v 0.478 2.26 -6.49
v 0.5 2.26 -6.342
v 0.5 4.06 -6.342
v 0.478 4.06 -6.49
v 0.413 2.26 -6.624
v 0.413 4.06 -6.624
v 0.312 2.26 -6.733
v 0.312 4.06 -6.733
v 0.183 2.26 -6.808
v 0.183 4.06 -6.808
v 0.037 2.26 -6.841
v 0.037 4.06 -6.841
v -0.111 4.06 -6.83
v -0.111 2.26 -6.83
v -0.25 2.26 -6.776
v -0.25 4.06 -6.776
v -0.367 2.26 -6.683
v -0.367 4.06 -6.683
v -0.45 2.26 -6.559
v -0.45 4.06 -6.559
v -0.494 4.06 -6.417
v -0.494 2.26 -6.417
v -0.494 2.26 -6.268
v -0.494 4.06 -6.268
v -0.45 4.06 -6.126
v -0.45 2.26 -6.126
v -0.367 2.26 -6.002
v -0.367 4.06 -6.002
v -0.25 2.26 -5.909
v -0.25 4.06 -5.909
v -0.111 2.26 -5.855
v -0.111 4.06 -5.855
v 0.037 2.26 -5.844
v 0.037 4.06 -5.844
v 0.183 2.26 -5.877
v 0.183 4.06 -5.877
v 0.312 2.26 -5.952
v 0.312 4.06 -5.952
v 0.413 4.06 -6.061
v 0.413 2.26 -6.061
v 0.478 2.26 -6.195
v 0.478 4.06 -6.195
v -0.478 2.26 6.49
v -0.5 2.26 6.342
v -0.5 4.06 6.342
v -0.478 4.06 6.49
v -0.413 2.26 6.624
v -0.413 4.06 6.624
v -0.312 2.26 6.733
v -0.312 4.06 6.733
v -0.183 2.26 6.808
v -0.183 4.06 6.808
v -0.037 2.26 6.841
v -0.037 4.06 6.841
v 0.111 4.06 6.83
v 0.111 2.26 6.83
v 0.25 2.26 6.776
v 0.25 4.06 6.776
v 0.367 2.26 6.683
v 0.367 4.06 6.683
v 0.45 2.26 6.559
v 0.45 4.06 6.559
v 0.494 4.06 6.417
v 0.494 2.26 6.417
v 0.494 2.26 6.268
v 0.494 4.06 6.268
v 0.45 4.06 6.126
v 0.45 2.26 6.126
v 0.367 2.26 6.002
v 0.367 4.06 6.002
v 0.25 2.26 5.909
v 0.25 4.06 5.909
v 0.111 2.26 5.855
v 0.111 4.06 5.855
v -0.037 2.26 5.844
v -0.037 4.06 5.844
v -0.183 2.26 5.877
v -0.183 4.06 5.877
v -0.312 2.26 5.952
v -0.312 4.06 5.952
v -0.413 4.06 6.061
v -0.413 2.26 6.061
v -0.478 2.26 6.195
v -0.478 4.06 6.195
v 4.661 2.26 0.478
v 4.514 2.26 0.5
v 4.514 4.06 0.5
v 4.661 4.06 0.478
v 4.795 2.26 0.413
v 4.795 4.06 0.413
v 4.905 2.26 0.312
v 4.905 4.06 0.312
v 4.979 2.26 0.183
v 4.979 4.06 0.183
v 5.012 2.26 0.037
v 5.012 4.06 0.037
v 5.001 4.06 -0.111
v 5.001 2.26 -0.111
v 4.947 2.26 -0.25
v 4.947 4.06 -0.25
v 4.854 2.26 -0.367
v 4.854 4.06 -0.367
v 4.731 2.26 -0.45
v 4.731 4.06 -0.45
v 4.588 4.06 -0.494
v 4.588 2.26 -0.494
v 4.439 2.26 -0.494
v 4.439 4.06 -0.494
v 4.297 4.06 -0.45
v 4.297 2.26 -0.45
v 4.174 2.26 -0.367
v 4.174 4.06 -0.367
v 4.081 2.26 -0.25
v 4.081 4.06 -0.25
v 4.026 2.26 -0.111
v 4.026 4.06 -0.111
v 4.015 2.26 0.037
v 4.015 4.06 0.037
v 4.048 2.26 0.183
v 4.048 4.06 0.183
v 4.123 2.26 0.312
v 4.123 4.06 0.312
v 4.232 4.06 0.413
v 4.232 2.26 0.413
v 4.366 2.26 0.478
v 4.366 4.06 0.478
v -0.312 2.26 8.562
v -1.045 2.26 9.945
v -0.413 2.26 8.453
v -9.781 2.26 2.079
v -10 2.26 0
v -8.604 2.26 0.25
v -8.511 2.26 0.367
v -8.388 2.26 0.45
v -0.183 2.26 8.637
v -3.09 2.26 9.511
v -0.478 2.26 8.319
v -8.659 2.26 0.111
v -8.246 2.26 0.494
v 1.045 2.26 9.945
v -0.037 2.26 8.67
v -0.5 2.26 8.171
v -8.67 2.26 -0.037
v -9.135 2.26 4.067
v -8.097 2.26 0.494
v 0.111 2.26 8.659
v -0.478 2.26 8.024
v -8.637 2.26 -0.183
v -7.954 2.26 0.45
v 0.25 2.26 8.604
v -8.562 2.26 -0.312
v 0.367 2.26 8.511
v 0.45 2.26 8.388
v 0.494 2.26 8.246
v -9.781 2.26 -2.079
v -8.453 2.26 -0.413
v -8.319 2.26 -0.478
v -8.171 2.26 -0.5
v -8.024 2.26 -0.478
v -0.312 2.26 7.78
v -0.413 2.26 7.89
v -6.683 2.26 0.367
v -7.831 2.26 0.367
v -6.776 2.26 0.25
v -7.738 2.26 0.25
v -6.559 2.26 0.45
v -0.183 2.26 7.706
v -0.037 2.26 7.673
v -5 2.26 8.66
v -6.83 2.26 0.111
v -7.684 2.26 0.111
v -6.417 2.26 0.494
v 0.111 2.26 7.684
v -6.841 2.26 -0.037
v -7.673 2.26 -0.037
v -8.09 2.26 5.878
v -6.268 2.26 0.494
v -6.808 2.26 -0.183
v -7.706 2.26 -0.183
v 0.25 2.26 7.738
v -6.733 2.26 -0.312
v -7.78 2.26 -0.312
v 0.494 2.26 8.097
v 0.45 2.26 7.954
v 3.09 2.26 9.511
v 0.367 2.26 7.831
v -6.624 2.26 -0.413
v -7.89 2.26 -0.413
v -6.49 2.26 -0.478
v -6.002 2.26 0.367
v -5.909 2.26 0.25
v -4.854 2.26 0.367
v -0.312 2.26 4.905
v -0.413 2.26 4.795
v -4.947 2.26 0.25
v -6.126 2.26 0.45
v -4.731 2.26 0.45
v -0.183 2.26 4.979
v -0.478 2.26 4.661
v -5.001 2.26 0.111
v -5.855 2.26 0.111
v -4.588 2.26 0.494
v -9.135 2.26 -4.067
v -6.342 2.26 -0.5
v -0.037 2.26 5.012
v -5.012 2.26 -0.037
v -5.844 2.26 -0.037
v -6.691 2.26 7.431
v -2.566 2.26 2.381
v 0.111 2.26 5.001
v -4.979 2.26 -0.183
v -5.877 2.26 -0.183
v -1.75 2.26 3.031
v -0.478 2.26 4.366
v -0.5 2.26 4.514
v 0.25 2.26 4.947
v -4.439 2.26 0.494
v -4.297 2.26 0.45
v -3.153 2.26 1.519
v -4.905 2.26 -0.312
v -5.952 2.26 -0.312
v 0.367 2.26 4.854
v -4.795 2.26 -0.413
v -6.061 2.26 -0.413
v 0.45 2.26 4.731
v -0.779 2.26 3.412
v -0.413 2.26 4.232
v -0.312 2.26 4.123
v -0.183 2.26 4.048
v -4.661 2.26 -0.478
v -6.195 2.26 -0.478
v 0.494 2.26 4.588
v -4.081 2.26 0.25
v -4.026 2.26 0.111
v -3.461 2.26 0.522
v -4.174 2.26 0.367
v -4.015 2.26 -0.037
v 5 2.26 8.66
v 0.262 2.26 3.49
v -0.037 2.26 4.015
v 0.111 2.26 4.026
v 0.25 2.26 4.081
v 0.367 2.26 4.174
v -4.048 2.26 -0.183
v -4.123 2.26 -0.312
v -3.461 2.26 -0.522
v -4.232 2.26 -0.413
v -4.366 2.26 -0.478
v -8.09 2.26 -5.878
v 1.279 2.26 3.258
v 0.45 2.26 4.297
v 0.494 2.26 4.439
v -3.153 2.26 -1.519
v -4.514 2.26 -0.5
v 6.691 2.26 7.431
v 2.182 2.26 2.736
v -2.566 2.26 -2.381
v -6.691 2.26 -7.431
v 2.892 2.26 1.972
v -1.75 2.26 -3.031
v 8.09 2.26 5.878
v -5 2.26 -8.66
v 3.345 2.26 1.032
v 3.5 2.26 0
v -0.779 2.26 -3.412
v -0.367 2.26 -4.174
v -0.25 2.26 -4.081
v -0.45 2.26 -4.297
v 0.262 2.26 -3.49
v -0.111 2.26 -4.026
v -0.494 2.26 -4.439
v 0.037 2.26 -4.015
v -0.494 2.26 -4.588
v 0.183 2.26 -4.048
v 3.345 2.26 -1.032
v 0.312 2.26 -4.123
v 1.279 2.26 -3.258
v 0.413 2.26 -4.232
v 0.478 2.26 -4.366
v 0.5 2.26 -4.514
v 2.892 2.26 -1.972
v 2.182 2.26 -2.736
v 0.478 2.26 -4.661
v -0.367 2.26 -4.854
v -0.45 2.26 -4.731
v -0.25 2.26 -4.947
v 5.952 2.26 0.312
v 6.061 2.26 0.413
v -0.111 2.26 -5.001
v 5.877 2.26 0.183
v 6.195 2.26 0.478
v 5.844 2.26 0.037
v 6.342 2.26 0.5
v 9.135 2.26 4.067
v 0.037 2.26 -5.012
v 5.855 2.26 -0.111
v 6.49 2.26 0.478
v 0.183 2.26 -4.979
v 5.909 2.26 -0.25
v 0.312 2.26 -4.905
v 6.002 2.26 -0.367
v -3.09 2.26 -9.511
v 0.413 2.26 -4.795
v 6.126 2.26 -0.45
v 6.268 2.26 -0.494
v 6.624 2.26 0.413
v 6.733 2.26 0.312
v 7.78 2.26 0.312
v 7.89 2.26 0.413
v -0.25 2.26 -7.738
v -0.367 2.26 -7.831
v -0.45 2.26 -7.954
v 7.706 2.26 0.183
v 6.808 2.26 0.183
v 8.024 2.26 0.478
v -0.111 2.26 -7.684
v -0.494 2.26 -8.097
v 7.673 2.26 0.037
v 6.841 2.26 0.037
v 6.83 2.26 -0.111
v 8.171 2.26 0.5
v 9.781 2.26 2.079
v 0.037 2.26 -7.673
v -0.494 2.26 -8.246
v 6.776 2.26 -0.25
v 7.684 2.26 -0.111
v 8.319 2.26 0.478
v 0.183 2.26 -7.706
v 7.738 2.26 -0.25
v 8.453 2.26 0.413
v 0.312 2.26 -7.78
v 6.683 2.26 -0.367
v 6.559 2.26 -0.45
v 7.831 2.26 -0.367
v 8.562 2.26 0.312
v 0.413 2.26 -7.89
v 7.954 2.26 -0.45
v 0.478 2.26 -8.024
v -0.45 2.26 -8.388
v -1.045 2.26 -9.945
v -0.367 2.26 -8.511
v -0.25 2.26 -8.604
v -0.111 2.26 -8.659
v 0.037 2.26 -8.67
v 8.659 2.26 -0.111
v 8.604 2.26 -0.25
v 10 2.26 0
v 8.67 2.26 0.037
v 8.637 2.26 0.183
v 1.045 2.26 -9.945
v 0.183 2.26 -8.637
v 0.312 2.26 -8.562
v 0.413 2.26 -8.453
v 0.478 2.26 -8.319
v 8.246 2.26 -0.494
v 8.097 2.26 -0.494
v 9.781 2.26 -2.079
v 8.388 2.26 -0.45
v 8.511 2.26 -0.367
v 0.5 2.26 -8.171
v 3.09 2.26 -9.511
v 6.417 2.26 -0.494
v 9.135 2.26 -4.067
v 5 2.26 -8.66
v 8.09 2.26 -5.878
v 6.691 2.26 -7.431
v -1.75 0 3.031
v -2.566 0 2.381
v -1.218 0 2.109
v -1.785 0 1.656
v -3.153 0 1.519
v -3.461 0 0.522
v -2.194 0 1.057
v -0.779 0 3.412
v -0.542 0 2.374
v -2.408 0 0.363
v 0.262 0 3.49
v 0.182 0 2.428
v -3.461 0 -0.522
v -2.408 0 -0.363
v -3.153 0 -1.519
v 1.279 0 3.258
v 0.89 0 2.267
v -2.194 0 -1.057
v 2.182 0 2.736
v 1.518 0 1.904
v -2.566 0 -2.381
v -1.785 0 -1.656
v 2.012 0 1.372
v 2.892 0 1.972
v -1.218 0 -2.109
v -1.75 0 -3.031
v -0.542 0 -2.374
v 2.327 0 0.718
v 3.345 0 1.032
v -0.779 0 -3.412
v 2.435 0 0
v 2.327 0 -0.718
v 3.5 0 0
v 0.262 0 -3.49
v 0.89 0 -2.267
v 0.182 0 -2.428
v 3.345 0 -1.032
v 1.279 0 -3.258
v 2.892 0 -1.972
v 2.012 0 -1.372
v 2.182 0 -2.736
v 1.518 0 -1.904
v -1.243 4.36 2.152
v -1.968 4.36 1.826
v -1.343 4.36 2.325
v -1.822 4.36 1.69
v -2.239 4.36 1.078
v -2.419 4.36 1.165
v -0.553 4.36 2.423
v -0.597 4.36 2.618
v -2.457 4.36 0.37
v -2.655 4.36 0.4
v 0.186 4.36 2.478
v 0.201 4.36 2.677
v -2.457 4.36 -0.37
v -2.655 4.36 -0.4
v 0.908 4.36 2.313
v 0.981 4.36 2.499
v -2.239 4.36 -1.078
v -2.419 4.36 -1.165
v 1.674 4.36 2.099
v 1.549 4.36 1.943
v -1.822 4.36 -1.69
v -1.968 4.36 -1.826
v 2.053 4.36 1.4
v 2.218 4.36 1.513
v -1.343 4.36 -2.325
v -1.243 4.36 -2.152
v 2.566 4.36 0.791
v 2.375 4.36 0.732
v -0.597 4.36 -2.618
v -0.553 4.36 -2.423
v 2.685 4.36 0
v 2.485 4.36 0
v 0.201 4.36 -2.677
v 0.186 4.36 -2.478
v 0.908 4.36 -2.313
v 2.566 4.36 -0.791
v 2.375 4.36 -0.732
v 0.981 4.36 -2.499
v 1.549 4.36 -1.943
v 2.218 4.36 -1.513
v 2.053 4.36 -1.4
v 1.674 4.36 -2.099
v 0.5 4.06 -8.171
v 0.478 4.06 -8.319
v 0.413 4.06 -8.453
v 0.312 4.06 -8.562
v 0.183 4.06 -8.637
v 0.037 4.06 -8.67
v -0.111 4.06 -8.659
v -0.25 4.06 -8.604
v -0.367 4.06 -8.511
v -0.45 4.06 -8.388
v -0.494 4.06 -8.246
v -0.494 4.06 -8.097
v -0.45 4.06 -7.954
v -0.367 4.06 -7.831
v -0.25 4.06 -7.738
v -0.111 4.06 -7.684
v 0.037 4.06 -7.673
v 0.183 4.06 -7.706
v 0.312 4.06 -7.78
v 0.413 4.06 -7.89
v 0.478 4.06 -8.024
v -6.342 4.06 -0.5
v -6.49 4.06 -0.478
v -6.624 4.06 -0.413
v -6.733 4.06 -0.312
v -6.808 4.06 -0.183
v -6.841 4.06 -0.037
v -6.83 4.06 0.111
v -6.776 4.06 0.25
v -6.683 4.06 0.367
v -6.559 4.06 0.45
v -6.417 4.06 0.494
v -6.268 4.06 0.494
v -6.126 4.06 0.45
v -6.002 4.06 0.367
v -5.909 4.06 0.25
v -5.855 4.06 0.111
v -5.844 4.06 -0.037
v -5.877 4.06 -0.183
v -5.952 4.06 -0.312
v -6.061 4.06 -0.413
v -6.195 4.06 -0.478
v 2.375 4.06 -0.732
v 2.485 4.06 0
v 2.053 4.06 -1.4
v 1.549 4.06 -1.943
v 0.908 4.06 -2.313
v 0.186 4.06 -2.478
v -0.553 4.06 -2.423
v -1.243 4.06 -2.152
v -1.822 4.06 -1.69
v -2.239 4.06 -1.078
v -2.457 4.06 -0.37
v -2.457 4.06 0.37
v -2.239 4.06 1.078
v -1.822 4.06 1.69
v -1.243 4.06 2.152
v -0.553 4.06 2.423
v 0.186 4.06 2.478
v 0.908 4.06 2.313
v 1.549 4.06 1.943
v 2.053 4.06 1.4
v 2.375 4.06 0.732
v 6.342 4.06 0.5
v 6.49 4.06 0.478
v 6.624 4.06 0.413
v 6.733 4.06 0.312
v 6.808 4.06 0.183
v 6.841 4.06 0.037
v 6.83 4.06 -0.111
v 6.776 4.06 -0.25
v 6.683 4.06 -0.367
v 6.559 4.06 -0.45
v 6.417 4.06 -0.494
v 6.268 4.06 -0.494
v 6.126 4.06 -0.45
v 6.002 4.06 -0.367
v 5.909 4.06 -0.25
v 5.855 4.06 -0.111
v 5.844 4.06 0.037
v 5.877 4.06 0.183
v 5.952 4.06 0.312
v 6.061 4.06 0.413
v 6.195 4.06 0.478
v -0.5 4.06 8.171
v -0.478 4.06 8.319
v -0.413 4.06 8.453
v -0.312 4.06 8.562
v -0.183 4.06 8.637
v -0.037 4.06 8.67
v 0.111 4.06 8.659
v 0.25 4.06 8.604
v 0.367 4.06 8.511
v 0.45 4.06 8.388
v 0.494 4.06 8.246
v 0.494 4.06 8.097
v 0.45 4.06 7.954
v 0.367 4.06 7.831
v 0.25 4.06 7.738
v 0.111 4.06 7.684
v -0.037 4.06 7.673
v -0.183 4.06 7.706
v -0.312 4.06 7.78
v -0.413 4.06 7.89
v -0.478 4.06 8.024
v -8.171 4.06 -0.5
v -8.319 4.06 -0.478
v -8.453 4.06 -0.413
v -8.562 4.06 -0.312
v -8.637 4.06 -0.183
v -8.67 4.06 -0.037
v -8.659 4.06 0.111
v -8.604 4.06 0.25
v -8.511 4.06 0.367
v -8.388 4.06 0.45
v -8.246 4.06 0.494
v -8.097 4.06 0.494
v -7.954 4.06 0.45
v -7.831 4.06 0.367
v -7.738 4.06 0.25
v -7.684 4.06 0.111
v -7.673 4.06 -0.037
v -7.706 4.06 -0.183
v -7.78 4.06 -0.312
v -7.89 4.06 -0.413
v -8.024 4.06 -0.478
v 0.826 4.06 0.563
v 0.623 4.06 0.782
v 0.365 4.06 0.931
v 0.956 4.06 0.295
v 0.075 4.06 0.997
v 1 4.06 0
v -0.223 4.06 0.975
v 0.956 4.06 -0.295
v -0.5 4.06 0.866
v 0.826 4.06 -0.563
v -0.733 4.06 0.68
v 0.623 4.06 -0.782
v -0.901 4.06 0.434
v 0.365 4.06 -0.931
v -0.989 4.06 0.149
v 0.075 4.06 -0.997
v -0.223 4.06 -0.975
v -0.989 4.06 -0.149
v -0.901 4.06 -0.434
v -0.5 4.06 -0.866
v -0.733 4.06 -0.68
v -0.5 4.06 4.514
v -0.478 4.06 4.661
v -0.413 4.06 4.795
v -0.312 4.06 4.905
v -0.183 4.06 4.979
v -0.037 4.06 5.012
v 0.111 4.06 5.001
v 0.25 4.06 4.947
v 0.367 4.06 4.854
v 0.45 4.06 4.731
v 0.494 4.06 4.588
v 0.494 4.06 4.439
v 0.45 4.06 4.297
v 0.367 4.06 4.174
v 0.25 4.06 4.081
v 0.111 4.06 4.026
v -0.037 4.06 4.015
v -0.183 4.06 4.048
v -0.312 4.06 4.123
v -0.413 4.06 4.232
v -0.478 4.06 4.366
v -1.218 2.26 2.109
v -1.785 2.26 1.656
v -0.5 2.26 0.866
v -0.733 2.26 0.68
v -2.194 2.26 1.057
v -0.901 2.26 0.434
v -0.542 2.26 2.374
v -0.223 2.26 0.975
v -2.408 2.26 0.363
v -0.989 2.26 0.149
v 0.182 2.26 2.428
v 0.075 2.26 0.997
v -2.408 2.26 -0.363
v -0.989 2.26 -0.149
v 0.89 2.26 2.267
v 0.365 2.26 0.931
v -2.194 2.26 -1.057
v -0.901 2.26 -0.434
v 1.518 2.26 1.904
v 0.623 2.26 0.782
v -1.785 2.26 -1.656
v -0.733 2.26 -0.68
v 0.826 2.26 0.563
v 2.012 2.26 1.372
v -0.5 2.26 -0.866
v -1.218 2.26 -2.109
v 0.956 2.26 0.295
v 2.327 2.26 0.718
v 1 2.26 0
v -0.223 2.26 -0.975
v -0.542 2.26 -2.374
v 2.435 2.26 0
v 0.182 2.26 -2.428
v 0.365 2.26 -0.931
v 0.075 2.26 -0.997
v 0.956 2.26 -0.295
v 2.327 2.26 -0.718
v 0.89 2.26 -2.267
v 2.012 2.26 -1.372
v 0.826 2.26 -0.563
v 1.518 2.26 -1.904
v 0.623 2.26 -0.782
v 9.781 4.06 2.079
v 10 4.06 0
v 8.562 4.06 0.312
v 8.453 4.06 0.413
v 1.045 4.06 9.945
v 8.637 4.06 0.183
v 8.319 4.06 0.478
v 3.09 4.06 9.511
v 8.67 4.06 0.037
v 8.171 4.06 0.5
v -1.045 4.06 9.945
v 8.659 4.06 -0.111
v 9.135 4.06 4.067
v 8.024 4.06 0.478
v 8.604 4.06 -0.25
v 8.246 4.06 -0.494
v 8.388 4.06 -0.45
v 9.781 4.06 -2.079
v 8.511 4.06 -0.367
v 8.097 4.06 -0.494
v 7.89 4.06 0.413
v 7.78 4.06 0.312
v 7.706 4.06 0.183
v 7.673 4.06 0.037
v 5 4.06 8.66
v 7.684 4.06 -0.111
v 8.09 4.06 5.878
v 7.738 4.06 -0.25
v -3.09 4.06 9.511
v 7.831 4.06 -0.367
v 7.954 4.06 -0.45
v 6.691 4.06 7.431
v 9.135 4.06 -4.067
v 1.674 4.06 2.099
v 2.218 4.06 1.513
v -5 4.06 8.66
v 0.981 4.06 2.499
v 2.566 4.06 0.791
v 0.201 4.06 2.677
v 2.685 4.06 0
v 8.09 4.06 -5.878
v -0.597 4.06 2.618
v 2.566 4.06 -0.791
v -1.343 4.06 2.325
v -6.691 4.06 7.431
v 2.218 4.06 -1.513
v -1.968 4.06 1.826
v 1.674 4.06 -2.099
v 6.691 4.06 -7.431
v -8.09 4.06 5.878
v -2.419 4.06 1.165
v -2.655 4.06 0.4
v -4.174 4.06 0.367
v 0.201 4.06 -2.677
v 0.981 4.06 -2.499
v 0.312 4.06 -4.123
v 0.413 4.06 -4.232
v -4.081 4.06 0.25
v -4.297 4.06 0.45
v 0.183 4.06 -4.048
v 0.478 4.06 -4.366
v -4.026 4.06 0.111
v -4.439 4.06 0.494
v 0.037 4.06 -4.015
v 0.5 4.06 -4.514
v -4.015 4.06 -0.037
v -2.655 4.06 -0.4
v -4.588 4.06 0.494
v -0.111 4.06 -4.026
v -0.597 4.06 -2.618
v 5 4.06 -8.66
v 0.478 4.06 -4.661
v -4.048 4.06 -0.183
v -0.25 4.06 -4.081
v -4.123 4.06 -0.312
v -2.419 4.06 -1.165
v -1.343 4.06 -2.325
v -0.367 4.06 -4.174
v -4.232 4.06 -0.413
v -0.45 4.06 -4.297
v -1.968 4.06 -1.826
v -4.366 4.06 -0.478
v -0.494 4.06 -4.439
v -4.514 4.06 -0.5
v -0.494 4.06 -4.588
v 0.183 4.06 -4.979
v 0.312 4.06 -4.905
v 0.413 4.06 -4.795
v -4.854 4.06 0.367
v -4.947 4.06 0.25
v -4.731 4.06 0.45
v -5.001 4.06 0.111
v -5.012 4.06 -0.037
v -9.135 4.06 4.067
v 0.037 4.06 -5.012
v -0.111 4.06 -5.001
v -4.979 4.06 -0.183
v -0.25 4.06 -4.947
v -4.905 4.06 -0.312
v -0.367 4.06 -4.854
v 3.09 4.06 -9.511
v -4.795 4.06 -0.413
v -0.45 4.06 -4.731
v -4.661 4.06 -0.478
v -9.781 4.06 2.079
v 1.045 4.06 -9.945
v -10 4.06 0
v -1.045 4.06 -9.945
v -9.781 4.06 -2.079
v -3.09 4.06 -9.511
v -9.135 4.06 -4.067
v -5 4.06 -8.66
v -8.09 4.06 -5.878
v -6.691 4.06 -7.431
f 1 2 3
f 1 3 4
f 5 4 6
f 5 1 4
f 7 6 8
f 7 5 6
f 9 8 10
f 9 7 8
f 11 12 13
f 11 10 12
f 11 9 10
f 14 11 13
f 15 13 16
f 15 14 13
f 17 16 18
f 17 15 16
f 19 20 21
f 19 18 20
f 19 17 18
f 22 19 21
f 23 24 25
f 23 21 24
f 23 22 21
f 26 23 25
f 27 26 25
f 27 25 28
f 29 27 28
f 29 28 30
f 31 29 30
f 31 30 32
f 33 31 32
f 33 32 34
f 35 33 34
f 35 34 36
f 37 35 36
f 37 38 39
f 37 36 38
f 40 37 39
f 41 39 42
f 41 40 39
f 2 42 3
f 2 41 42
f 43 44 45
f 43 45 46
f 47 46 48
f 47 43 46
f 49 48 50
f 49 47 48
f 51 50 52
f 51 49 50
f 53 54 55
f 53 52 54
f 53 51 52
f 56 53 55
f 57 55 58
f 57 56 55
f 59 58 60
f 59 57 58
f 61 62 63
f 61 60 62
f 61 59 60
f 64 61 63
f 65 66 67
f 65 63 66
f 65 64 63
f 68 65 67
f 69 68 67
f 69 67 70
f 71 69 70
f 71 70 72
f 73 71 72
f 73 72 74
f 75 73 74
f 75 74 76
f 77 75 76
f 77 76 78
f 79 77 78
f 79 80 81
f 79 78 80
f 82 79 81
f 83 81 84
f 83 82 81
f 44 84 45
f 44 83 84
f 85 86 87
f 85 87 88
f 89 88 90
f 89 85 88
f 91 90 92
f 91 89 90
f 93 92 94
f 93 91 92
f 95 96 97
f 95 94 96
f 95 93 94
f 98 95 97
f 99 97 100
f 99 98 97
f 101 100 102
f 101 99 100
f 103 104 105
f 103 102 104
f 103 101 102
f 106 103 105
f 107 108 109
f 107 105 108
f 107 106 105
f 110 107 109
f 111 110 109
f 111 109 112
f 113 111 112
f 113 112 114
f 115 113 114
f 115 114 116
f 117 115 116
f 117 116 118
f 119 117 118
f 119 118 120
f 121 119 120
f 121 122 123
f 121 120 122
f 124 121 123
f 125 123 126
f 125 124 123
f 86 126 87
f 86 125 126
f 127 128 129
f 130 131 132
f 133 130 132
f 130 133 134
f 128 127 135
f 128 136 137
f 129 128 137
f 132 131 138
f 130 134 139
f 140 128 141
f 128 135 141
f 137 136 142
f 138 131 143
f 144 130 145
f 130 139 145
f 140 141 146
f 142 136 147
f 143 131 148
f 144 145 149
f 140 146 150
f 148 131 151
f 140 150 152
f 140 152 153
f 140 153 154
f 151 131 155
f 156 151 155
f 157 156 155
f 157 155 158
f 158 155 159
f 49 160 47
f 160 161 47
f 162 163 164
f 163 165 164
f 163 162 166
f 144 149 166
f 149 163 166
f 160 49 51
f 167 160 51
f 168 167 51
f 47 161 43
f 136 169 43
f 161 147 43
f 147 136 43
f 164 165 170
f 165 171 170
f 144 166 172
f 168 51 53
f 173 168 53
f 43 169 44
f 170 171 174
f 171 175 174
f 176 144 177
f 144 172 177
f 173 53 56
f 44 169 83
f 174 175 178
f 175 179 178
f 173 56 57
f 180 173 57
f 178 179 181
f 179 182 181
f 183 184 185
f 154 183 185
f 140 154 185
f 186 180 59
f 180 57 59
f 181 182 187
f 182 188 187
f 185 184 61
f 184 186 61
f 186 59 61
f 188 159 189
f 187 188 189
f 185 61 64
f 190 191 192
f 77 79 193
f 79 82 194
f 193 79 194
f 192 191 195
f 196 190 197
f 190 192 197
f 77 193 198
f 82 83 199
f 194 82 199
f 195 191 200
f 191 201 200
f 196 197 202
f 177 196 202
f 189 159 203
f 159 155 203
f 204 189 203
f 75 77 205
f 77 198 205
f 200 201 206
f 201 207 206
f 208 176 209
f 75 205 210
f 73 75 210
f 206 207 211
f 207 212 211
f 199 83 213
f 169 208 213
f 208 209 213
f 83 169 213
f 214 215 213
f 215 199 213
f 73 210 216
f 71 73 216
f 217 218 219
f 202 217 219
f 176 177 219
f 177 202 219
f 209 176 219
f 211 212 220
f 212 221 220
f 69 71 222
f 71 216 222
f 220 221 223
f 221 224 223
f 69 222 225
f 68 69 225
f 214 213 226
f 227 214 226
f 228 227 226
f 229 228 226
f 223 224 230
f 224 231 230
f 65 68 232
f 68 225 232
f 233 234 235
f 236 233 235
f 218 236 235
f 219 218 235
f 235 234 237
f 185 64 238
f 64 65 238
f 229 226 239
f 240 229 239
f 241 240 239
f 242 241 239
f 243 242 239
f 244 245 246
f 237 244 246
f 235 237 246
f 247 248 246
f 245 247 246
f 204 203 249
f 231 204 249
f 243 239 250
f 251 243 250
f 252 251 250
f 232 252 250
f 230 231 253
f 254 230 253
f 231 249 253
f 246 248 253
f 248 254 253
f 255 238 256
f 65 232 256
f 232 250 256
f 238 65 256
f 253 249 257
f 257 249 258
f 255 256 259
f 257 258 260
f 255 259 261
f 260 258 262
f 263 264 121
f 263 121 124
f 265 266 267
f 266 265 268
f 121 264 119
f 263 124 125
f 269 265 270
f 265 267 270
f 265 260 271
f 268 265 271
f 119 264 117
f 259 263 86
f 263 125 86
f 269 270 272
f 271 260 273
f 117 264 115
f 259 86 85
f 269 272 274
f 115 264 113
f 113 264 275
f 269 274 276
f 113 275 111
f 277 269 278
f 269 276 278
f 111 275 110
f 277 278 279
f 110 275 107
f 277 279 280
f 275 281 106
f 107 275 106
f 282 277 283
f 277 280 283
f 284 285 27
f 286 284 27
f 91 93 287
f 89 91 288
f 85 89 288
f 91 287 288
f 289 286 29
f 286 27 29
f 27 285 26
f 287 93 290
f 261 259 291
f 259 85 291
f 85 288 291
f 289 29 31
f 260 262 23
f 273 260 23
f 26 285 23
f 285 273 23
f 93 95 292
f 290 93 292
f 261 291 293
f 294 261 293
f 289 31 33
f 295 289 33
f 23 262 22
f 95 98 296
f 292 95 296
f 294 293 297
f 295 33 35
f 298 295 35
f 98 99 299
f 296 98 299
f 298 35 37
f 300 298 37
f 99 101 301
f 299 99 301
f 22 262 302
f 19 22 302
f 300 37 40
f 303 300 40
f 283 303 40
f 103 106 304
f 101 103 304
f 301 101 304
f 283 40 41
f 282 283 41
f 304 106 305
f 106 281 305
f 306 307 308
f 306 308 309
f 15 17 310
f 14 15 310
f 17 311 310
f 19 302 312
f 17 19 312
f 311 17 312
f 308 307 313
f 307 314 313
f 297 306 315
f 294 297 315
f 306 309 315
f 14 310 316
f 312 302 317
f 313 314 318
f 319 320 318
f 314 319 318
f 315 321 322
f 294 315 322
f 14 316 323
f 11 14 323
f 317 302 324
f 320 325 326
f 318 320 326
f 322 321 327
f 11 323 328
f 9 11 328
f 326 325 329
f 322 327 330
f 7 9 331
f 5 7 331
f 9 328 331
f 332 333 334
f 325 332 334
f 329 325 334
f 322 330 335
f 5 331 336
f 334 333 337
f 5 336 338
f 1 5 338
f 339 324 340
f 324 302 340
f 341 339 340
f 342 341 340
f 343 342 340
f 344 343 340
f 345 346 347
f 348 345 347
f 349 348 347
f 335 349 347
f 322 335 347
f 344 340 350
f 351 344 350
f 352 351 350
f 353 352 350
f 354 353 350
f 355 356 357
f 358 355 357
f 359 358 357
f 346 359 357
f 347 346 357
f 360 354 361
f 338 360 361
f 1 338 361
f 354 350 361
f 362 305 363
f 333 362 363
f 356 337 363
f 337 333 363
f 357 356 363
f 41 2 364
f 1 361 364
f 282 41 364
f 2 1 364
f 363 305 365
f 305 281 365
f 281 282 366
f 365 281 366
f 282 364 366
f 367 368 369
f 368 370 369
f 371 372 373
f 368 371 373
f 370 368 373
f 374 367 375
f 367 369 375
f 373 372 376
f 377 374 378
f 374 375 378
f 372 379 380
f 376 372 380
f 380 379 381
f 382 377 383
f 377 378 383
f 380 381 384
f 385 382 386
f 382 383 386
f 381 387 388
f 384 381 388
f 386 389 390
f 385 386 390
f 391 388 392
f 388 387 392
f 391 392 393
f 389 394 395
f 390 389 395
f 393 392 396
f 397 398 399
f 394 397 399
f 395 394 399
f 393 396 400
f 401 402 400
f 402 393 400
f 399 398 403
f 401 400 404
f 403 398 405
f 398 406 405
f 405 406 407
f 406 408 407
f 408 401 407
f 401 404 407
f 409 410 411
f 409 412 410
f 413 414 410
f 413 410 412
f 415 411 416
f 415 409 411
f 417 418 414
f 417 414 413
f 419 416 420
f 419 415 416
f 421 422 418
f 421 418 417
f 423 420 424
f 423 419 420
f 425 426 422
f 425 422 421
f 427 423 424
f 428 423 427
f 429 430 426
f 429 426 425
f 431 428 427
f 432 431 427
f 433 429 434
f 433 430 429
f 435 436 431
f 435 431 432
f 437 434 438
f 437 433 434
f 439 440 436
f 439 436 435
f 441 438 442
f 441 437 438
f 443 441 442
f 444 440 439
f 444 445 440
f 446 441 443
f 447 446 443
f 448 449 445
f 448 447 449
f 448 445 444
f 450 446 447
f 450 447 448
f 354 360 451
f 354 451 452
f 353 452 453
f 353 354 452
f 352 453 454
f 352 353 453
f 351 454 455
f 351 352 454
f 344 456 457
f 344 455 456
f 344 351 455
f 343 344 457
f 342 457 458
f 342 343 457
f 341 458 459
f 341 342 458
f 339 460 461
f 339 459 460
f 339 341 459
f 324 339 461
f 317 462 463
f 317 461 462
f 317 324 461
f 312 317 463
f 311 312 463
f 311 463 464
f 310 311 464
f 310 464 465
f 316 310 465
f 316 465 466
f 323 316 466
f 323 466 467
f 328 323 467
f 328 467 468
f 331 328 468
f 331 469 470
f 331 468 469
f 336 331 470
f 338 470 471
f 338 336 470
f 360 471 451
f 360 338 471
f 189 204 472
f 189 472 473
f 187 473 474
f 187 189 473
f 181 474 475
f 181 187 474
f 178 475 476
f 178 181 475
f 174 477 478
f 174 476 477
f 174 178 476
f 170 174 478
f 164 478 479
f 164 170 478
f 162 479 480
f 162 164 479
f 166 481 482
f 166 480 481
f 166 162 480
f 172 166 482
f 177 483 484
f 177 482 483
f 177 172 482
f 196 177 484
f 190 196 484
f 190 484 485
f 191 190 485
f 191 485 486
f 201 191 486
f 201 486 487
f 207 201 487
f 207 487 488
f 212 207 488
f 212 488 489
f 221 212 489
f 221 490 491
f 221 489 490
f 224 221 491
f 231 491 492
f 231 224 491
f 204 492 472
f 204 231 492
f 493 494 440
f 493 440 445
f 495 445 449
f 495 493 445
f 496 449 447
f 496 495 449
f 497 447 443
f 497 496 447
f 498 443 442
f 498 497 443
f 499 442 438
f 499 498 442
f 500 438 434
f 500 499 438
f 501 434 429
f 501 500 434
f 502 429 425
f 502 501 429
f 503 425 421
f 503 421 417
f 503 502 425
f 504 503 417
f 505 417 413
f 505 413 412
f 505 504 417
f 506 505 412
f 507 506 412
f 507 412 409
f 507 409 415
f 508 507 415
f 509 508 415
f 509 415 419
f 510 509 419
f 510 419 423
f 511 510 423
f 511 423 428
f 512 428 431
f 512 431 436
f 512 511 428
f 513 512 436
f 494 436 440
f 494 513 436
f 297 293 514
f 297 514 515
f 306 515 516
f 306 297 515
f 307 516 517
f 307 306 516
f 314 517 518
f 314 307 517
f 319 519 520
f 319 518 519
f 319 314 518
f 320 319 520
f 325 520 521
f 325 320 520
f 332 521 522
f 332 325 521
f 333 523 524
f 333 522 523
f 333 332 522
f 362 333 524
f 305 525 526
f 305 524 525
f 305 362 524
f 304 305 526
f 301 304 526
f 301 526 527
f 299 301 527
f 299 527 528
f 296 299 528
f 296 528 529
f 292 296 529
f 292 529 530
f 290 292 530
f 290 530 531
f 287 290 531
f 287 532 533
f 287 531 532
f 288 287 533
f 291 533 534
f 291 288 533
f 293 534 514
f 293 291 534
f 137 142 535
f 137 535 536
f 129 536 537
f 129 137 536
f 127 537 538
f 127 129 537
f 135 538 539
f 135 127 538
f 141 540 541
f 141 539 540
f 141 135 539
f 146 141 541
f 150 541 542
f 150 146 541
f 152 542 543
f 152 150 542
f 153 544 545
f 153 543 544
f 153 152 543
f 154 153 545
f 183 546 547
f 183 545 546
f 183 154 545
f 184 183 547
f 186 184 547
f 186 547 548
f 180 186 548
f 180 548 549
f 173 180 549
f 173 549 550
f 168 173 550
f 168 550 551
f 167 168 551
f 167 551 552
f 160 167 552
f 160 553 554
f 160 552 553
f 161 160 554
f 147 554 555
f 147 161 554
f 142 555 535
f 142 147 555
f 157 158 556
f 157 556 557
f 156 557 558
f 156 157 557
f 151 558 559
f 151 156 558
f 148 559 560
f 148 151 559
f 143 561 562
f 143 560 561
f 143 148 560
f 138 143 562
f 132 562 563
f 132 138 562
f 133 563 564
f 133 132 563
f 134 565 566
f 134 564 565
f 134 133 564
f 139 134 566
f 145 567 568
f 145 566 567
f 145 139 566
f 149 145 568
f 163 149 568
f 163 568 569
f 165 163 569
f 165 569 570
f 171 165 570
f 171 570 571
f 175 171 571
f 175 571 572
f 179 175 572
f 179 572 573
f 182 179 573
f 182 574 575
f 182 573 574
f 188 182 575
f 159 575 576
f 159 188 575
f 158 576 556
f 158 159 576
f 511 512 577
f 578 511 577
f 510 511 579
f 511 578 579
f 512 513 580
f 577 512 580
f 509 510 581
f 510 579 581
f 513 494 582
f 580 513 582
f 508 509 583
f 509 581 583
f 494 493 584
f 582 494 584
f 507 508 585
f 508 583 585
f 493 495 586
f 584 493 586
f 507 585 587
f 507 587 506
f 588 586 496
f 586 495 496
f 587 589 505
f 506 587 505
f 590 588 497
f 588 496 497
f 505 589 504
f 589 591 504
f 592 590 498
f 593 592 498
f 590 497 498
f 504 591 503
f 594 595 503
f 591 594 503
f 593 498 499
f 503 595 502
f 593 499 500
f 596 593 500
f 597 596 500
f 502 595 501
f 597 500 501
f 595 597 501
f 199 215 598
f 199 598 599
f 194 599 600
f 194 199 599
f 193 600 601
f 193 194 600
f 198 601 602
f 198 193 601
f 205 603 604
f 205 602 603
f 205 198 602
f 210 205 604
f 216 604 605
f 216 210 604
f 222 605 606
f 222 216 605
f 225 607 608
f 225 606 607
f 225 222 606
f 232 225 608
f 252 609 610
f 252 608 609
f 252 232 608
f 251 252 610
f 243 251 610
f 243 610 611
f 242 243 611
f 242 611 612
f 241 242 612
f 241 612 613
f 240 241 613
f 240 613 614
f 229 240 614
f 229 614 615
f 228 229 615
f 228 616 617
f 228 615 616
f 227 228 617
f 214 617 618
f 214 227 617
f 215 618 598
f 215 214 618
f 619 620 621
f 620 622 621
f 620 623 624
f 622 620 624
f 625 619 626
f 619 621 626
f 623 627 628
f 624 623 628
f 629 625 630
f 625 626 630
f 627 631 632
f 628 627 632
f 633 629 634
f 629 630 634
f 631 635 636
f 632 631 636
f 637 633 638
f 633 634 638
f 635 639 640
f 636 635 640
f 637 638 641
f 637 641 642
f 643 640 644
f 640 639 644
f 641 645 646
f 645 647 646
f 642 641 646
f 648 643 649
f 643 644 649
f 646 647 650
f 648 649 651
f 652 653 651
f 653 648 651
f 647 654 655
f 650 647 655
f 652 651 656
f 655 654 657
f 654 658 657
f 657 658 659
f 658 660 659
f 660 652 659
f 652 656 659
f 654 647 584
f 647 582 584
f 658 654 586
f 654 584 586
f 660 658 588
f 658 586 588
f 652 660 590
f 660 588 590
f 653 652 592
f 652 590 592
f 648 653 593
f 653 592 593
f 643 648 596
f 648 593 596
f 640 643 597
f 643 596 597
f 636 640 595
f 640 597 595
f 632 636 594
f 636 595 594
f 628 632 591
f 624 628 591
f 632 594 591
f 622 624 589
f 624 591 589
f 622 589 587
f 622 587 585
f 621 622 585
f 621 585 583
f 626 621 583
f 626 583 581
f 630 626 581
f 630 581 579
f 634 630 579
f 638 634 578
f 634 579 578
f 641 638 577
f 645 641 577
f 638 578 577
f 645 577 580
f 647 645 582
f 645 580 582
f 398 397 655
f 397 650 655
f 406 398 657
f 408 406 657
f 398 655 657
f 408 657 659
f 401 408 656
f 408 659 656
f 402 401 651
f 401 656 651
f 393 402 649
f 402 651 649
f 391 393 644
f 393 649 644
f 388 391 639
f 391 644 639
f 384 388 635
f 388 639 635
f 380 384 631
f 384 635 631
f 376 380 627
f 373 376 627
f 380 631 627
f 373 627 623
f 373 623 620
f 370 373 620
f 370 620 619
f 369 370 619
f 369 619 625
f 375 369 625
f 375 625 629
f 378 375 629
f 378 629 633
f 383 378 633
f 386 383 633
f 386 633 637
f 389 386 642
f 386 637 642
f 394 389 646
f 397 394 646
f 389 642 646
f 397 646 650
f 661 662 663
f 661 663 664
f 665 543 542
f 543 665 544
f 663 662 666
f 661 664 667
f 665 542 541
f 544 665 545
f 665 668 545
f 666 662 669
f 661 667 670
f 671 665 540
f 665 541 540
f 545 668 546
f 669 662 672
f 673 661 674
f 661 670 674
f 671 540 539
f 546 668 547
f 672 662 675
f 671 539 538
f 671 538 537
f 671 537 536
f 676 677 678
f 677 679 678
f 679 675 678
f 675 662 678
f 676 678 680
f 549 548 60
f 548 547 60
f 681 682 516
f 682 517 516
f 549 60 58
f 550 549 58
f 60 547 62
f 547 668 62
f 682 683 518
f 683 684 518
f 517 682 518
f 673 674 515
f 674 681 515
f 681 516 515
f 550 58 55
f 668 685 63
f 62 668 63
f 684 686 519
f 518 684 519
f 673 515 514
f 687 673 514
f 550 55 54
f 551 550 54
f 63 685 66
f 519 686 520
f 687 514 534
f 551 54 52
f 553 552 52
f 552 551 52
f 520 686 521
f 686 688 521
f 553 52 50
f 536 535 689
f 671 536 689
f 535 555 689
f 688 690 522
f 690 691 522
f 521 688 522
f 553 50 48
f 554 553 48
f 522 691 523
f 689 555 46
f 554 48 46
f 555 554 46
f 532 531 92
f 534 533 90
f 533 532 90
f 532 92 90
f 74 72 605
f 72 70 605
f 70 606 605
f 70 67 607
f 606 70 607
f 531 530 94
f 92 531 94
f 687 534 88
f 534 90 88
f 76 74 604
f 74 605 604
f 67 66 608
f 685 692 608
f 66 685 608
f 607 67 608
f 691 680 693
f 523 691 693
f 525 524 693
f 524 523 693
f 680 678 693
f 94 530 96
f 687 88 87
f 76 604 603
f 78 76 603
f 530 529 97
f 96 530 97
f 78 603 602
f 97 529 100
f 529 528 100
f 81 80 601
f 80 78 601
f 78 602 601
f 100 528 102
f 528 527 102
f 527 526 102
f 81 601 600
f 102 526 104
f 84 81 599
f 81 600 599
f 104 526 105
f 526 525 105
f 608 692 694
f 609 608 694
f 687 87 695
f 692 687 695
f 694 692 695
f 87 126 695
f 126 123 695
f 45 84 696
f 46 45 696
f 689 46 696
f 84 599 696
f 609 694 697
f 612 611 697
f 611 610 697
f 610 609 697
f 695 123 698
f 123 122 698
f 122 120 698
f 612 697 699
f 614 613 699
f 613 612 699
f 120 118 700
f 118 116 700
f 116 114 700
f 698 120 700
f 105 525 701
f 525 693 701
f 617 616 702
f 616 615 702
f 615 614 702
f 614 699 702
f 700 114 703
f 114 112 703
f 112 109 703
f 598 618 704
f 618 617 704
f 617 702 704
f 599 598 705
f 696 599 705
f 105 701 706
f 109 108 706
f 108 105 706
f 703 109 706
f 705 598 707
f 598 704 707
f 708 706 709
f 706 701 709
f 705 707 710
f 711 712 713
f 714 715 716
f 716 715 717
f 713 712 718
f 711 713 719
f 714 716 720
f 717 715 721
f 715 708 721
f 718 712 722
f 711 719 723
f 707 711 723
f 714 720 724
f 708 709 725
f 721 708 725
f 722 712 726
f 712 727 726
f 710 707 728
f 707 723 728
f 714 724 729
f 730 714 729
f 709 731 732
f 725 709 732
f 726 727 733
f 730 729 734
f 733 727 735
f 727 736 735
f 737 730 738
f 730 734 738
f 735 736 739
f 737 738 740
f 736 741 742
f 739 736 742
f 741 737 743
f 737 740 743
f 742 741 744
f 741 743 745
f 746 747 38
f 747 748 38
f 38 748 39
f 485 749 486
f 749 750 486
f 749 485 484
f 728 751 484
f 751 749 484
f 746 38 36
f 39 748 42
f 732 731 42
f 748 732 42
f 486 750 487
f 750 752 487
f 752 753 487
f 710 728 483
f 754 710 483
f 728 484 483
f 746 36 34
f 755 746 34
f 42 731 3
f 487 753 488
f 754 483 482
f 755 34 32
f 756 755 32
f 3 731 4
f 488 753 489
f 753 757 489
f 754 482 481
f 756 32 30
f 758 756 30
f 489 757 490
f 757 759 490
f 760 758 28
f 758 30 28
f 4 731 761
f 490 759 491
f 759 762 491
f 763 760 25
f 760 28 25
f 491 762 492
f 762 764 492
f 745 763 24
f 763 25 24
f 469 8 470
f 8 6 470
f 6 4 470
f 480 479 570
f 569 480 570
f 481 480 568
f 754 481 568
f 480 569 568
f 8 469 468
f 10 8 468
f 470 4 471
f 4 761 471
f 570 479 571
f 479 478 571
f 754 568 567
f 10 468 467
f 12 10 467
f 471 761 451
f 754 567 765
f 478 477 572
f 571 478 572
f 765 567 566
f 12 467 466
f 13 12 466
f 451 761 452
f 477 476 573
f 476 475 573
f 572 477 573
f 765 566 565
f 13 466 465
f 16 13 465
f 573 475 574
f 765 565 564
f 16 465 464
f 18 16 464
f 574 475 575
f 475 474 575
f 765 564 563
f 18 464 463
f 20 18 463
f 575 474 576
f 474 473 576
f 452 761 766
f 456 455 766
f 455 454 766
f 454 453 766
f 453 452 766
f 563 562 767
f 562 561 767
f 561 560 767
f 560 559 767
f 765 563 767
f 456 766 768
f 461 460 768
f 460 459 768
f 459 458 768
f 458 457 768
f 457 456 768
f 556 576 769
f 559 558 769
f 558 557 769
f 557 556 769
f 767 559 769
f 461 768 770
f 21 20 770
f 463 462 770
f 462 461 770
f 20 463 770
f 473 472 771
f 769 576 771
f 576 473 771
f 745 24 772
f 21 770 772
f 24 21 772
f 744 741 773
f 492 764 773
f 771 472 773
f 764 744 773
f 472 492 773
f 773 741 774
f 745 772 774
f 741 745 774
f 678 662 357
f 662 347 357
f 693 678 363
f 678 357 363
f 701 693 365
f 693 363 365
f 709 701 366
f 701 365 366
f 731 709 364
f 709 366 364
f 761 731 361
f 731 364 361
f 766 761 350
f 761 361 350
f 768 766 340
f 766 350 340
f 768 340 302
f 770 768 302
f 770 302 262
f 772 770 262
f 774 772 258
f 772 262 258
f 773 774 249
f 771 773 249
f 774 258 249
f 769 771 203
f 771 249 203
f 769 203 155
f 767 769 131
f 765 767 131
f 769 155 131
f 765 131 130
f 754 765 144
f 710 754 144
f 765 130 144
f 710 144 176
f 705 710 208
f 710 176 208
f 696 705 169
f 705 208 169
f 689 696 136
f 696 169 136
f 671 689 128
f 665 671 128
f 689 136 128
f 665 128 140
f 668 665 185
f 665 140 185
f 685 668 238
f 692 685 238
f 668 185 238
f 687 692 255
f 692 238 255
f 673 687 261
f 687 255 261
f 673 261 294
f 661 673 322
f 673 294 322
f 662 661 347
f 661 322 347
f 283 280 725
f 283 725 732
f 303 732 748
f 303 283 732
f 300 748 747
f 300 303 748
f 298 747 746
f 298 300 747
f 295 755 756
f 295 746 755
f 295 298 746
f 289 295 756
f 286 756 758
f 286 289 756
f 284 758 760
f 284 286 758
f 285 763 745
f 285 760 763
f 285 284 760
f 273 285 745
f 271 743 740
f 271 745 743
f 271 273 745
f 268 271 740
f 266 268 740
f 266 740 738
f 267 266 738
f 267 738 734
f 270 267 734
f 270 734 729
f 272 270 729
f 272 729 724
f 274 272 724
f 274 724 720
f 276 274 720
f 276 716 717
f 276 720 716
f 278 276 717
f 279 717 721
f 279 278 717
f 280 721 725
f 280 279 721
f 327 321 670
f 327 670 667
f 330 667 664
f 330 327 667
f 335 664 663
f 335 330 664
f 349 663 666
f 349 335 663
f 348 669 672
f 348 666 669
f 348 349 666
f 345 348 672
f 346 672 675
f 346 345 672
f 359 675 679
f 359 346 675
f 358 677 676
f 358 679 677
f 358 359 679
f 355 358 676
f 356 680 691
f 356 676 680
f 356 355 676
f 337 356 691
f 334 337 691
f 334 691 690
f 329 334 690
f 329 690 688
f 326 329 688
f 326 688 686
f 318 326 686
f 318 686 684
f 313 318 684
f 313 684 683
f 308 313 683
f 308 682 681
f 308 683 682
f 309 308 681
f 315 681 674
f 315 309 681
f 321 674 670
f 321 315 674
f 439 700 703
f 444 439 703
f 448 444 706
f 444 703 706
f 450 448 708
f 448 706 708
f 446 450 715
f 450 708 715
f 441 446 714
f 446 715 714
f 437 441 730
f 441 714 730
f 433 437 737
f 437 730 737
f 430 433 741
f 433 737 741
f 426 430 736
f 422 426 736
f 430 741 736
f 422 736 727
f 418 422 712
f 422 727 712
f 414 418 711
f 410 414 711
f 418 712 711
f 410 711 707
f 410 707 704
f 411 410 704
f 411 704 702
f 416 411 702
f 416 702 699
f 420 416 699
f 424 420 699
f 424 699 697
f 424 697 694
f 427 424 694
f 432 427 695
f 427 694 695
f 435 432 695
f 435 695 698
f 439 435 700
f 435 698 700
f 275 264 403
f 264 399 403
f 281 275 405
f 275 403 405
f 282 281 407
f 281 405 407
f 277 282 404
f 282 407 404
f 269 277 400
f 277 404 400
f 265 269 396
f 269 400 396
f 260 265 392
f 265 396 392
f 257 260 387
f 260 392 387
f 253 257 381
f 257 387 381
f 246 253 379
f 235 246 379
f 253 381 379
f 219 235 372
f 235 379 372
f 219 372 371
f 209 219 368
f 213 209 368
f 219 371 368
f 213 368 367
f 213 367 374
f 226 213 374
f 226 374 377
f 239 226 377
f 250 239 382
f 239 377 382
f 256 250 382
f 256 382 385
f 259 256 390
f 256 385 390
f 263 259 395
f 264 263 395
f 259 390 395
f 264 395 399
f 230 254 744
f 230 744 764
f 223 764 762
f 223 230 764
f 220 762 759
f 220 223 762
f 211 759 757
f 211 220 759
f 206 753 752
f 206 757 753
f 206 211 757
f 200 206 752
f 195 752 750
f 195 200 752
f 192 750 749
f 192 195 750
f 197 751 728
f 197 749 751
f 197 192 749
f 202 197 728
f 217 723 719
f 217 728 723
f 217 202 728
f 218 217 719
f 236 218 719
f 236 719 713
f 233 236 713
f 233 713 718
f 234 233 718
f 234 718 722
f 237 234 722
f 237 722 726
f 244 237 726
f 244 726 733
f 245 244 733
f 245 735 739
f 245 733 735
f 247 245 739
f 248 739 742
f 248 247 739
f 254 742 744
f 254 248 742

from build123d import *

# Parameters (mm, degrees)
SKETCH2_R           = 2.685
SKETCH2_R_2         = 2.485
BOSS_EXTRUDE1_DEPTH = 0.3
SKETCH4_R           = 0.5
CUT_EXTRUDE2_DEPTH  = 5.36
CIRPATTERN1_COUNT   = 4


with BuildPart() as part:
    # Sketch1 → Revolve2 (revolve)
    with BuildSketch(Plane.XY):
        Polygon((1, 2.26), (1, 4.06), (10, 4.06), (10, 2.26), (3.5, 2.26), (3.5, 0), (2.435, 0), (2.435, 2.26), align=None)
    revolve(axis=Axis((0, 0, 0), (0, 1, 0)))

    # Sketch2 → Boss-Extrude1 (add)
    with BuildSketch(Plane(origin=(0, 4.06, 0), x_dir=(1, 0, 0), z_dir=(0, 1, 0))):
        Circle(SKETCH2_R)
        Circle(SKETCH2_R_2, mode=Mode.SUBTRACT)
    extrude(amount=BOSS_EXTRUDE1_DEPTH)

    # Sketch4 → Cut-Extrude2 (cut, through all)
    with BuildSketch(Plane(origin=(0, 0, 0), x_dir=(1, 0, 0), z_dir=(0, 1, 0))):
        with Locations((0, 4.51375)):
            Circle(SKETCH4_R)
        with Locations((0, 6.3425)):
            Circle(SKETCH4_R)
        with Locations((0, 8.17125)):
            Circle(SKETCH4_R)
    cut_extrude2 = extrude(amount=CUT_EXTRUDE2_DEPTH, mode=Mode.SUBTRACT)

    # CirPattern1: Cut-Extrude2 ×4 about axis
    cirpattern1_axis = Axis((0, 0, 0), (0, 1, 0))
    for i in range(1, CIRPATTERN1_COUNT):
        add(cut_extrude2.rotate(cirpattern1_axis, i * 360 / CIRPATTERN1_COUNT), mode=Mode.SUBTRACT)


solid = part.part
